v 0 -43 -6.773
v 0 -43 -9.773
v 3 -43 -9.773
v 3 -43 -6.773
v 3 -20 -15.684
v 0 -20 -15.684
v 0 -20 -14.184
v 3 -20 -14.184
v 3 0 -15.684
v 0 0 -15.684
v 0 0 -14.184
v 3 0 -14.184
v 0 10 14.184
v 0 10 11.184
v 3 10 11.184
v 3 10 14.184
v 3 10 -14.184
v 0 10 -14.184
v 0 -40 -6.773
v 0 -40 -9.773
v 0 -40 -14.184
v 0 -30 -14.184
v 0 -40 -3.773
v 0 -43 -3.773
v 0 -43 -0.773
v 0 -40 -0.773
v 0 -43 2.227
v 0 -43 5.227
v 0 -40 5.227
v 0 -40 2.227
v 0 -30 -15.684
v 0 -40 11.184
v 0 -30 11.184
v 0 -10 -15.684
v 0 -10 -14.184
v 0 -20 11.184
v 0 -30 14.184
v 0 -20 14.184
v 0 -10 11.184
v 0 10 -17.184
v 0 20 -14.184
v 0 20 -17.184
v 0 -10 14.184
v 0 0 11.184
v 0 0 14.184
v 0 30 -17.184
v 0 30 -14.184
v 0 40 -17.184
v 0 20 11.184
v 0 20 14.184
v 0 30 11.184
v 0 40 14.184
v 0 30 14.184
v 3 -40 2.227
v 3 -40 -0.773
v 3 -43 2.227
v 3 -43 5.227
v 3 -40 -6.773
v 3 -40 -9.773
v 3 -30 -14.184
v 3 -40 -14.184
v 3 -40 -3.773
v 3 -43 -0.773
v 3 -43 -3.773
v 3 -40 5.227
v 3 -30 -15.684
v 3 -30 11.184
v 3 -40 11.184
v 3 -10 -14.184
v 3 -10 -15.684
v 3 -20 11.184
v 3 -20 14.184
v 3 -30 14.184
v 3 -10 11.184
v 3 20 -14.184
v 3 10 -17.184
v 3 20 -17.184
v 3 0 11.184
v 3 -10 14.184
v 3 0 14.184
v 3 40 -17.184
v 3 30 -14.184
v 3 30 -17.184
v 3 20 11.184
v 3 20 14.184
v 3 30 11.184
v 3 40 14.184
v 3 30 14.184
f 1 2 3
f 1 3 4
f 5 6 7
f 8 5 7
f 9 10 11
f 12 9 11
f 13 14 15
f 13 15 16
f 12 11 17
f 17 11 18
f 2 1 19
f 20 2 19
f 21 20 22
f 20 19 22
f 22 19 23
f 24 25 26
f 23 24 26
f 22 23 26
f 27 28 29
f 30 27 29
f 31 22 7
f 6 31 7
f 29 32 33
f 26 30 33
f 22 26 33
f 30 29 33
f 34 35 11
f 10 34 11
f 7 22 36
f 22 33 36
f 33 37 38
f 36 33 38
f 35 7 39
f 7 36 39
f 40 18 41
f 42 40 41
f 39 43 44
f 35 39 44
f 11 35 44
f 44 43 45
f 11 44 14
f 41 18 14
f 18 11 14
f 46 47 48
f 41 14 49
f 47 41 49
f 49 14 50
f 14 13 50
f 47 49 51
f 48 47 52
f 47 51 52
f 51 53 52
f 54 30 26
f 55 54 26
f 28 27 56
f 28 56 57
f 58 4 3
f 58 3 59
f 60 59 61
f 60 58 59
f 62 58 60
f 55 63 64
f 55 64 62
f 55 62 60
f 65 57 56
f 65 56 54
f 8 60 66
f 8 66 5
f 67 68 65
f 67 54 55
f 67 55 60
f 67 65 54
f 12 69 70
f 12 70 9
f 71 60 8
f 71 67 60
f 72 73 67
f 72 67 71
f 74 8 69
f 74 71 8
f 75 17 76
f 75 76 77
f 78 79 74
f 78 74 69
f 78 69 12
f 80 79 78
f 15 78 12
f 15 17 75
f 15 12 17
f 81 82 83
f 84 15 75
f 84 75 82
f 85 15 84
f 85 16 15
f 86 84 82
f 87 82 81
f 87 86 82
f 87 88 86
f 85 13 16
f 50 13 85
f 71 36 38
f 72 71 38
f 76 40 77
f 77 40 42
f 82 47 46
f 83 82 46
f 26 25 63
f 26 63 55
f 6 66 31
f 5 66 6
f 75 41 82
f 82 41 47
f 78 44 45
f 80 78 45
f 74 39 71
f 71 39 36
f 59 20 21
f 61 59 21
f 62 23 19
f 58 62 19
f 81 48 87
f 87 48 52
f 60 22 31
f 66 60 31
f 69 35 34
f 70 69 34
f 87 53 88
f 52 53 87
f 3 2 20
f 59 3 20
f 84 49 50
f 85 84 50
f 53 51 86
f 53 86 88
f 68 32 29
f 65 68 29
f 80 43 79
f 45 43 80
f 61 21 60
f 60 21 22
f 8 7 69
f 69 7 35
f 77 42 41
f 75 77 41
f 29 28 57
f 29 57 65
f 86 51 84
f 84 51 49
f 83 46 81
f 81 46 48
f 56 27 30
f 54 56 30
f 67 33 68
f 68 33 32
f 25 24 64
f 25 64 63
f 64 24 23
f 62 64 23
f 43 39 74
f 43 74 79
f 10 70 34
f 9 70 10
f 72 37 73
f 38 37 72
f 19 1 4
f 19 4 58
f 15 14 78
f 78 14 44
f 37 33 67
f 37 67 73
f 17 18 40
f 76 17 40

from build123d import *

# Parameters (mm, degrees)
F0_W     = 3
F0_H     = 3
F0_W_2   = 10
F1_DEPTH = 3
F2_W     = 10
F2_H     = 1.5
F3_DEPTH = 25


with BuildPart() as f1:
    # F0 (on Right) → F1 (new body)
    with BuildSketch(Plane.YZ):
        Polygon((-30, 11.18364), (-40, 11.18364), (-40, 5.22664), (-40, 2.22664), (-40, -0.77336), (-40, -3.77336), (-40, -6.77336), (-40, -9.77336), (-40, -11.18364), (-30, -11.18364), (-20, -11.18364), (-10, -11.18364), (0, -11.18364), (10, -11.18364), (20, -11.18364), (30, -11.18364), (40, -11.18364), (40, 11.18364), (30, 11.18364), (20, 11.18364), (10, 11.18364), (0, 11.18364), (-10, 11.18364), (-20, 11.18364), align=None)
        with Locations((-41.5, -8.27336)):
            Rectangle(F0_W, F0_H)
        with Locations((-41.5, 3.72664)):
            Rectangle(F0_W, F0_H)
        with Locations((-25, -12.68364)):
            Rectangle(F0_W_2, F0_H)
        with Locations((-25, 12.68364)):
            Rectangle(F0_W_2, F0_H)
        with Locations((-41.5, -2.27336)):
            Rectangle(F0_W, F0_H)
        with Locations((-5, -12.68364)):
            Rectangle(F0_W_2, F0_H)
        with Locations((-5, 12.68364)):
            Rectangle(F0_W_2, F0_H)
        with Locations((15, 12.68364)):
            Rectangle(F0_W_2, F0_H)
        with Locations((15, -12.68364)):
            Rectangle(F0_W_2, F0_H)
        with Locations((35, 12.68364)):
            Rectangle(F0_W_2, F0_H)
        with Locations((35, -12.68364)):
            Rectangle(F0_W_2, F0_H)
        with Locations((-25, -15.68364)):
            Rectangle(F0_W_2, F0_H)
        with Locations((-5, -15.68364)):
            Rectangle(F0_W_2, F0_H)
        with Locations((15, -15.68364)):
            Rectangle(F0_W_2, F0_H)
        with Locations((35, -15.68364)):
            Rectangle(F0_W_2, F0_H)
        with Locations((-35, -12.68364)):
            Rectangle(F0_W_2, F0_H)
        with Locations((-15, -12.68364)):
            Rectangle(F0_W_2, F0_H)
        with Locations((5, -12.68364)):
            Rectangle(F0_W_2, F0_H)
        with Locations((25, -12.68364)):
            Rectangle(F0_W_2, F0_H)
    extrude(amount=F1_DEPTH)

    # F2 (on face) → F3 (cut)
    with BuildSketch(Plane.YZ.offset(3)):
        with Locations((-25, -16.43364)):
            Rectangle(F2_W, F2_H)
        with Locations((-5, -16.43364)):
            Rectangle(F2_W, F2_H)
    extrude(amount=-F3_DEPTH, mode=Mode.SUBTRACT)


solid = f1.part
